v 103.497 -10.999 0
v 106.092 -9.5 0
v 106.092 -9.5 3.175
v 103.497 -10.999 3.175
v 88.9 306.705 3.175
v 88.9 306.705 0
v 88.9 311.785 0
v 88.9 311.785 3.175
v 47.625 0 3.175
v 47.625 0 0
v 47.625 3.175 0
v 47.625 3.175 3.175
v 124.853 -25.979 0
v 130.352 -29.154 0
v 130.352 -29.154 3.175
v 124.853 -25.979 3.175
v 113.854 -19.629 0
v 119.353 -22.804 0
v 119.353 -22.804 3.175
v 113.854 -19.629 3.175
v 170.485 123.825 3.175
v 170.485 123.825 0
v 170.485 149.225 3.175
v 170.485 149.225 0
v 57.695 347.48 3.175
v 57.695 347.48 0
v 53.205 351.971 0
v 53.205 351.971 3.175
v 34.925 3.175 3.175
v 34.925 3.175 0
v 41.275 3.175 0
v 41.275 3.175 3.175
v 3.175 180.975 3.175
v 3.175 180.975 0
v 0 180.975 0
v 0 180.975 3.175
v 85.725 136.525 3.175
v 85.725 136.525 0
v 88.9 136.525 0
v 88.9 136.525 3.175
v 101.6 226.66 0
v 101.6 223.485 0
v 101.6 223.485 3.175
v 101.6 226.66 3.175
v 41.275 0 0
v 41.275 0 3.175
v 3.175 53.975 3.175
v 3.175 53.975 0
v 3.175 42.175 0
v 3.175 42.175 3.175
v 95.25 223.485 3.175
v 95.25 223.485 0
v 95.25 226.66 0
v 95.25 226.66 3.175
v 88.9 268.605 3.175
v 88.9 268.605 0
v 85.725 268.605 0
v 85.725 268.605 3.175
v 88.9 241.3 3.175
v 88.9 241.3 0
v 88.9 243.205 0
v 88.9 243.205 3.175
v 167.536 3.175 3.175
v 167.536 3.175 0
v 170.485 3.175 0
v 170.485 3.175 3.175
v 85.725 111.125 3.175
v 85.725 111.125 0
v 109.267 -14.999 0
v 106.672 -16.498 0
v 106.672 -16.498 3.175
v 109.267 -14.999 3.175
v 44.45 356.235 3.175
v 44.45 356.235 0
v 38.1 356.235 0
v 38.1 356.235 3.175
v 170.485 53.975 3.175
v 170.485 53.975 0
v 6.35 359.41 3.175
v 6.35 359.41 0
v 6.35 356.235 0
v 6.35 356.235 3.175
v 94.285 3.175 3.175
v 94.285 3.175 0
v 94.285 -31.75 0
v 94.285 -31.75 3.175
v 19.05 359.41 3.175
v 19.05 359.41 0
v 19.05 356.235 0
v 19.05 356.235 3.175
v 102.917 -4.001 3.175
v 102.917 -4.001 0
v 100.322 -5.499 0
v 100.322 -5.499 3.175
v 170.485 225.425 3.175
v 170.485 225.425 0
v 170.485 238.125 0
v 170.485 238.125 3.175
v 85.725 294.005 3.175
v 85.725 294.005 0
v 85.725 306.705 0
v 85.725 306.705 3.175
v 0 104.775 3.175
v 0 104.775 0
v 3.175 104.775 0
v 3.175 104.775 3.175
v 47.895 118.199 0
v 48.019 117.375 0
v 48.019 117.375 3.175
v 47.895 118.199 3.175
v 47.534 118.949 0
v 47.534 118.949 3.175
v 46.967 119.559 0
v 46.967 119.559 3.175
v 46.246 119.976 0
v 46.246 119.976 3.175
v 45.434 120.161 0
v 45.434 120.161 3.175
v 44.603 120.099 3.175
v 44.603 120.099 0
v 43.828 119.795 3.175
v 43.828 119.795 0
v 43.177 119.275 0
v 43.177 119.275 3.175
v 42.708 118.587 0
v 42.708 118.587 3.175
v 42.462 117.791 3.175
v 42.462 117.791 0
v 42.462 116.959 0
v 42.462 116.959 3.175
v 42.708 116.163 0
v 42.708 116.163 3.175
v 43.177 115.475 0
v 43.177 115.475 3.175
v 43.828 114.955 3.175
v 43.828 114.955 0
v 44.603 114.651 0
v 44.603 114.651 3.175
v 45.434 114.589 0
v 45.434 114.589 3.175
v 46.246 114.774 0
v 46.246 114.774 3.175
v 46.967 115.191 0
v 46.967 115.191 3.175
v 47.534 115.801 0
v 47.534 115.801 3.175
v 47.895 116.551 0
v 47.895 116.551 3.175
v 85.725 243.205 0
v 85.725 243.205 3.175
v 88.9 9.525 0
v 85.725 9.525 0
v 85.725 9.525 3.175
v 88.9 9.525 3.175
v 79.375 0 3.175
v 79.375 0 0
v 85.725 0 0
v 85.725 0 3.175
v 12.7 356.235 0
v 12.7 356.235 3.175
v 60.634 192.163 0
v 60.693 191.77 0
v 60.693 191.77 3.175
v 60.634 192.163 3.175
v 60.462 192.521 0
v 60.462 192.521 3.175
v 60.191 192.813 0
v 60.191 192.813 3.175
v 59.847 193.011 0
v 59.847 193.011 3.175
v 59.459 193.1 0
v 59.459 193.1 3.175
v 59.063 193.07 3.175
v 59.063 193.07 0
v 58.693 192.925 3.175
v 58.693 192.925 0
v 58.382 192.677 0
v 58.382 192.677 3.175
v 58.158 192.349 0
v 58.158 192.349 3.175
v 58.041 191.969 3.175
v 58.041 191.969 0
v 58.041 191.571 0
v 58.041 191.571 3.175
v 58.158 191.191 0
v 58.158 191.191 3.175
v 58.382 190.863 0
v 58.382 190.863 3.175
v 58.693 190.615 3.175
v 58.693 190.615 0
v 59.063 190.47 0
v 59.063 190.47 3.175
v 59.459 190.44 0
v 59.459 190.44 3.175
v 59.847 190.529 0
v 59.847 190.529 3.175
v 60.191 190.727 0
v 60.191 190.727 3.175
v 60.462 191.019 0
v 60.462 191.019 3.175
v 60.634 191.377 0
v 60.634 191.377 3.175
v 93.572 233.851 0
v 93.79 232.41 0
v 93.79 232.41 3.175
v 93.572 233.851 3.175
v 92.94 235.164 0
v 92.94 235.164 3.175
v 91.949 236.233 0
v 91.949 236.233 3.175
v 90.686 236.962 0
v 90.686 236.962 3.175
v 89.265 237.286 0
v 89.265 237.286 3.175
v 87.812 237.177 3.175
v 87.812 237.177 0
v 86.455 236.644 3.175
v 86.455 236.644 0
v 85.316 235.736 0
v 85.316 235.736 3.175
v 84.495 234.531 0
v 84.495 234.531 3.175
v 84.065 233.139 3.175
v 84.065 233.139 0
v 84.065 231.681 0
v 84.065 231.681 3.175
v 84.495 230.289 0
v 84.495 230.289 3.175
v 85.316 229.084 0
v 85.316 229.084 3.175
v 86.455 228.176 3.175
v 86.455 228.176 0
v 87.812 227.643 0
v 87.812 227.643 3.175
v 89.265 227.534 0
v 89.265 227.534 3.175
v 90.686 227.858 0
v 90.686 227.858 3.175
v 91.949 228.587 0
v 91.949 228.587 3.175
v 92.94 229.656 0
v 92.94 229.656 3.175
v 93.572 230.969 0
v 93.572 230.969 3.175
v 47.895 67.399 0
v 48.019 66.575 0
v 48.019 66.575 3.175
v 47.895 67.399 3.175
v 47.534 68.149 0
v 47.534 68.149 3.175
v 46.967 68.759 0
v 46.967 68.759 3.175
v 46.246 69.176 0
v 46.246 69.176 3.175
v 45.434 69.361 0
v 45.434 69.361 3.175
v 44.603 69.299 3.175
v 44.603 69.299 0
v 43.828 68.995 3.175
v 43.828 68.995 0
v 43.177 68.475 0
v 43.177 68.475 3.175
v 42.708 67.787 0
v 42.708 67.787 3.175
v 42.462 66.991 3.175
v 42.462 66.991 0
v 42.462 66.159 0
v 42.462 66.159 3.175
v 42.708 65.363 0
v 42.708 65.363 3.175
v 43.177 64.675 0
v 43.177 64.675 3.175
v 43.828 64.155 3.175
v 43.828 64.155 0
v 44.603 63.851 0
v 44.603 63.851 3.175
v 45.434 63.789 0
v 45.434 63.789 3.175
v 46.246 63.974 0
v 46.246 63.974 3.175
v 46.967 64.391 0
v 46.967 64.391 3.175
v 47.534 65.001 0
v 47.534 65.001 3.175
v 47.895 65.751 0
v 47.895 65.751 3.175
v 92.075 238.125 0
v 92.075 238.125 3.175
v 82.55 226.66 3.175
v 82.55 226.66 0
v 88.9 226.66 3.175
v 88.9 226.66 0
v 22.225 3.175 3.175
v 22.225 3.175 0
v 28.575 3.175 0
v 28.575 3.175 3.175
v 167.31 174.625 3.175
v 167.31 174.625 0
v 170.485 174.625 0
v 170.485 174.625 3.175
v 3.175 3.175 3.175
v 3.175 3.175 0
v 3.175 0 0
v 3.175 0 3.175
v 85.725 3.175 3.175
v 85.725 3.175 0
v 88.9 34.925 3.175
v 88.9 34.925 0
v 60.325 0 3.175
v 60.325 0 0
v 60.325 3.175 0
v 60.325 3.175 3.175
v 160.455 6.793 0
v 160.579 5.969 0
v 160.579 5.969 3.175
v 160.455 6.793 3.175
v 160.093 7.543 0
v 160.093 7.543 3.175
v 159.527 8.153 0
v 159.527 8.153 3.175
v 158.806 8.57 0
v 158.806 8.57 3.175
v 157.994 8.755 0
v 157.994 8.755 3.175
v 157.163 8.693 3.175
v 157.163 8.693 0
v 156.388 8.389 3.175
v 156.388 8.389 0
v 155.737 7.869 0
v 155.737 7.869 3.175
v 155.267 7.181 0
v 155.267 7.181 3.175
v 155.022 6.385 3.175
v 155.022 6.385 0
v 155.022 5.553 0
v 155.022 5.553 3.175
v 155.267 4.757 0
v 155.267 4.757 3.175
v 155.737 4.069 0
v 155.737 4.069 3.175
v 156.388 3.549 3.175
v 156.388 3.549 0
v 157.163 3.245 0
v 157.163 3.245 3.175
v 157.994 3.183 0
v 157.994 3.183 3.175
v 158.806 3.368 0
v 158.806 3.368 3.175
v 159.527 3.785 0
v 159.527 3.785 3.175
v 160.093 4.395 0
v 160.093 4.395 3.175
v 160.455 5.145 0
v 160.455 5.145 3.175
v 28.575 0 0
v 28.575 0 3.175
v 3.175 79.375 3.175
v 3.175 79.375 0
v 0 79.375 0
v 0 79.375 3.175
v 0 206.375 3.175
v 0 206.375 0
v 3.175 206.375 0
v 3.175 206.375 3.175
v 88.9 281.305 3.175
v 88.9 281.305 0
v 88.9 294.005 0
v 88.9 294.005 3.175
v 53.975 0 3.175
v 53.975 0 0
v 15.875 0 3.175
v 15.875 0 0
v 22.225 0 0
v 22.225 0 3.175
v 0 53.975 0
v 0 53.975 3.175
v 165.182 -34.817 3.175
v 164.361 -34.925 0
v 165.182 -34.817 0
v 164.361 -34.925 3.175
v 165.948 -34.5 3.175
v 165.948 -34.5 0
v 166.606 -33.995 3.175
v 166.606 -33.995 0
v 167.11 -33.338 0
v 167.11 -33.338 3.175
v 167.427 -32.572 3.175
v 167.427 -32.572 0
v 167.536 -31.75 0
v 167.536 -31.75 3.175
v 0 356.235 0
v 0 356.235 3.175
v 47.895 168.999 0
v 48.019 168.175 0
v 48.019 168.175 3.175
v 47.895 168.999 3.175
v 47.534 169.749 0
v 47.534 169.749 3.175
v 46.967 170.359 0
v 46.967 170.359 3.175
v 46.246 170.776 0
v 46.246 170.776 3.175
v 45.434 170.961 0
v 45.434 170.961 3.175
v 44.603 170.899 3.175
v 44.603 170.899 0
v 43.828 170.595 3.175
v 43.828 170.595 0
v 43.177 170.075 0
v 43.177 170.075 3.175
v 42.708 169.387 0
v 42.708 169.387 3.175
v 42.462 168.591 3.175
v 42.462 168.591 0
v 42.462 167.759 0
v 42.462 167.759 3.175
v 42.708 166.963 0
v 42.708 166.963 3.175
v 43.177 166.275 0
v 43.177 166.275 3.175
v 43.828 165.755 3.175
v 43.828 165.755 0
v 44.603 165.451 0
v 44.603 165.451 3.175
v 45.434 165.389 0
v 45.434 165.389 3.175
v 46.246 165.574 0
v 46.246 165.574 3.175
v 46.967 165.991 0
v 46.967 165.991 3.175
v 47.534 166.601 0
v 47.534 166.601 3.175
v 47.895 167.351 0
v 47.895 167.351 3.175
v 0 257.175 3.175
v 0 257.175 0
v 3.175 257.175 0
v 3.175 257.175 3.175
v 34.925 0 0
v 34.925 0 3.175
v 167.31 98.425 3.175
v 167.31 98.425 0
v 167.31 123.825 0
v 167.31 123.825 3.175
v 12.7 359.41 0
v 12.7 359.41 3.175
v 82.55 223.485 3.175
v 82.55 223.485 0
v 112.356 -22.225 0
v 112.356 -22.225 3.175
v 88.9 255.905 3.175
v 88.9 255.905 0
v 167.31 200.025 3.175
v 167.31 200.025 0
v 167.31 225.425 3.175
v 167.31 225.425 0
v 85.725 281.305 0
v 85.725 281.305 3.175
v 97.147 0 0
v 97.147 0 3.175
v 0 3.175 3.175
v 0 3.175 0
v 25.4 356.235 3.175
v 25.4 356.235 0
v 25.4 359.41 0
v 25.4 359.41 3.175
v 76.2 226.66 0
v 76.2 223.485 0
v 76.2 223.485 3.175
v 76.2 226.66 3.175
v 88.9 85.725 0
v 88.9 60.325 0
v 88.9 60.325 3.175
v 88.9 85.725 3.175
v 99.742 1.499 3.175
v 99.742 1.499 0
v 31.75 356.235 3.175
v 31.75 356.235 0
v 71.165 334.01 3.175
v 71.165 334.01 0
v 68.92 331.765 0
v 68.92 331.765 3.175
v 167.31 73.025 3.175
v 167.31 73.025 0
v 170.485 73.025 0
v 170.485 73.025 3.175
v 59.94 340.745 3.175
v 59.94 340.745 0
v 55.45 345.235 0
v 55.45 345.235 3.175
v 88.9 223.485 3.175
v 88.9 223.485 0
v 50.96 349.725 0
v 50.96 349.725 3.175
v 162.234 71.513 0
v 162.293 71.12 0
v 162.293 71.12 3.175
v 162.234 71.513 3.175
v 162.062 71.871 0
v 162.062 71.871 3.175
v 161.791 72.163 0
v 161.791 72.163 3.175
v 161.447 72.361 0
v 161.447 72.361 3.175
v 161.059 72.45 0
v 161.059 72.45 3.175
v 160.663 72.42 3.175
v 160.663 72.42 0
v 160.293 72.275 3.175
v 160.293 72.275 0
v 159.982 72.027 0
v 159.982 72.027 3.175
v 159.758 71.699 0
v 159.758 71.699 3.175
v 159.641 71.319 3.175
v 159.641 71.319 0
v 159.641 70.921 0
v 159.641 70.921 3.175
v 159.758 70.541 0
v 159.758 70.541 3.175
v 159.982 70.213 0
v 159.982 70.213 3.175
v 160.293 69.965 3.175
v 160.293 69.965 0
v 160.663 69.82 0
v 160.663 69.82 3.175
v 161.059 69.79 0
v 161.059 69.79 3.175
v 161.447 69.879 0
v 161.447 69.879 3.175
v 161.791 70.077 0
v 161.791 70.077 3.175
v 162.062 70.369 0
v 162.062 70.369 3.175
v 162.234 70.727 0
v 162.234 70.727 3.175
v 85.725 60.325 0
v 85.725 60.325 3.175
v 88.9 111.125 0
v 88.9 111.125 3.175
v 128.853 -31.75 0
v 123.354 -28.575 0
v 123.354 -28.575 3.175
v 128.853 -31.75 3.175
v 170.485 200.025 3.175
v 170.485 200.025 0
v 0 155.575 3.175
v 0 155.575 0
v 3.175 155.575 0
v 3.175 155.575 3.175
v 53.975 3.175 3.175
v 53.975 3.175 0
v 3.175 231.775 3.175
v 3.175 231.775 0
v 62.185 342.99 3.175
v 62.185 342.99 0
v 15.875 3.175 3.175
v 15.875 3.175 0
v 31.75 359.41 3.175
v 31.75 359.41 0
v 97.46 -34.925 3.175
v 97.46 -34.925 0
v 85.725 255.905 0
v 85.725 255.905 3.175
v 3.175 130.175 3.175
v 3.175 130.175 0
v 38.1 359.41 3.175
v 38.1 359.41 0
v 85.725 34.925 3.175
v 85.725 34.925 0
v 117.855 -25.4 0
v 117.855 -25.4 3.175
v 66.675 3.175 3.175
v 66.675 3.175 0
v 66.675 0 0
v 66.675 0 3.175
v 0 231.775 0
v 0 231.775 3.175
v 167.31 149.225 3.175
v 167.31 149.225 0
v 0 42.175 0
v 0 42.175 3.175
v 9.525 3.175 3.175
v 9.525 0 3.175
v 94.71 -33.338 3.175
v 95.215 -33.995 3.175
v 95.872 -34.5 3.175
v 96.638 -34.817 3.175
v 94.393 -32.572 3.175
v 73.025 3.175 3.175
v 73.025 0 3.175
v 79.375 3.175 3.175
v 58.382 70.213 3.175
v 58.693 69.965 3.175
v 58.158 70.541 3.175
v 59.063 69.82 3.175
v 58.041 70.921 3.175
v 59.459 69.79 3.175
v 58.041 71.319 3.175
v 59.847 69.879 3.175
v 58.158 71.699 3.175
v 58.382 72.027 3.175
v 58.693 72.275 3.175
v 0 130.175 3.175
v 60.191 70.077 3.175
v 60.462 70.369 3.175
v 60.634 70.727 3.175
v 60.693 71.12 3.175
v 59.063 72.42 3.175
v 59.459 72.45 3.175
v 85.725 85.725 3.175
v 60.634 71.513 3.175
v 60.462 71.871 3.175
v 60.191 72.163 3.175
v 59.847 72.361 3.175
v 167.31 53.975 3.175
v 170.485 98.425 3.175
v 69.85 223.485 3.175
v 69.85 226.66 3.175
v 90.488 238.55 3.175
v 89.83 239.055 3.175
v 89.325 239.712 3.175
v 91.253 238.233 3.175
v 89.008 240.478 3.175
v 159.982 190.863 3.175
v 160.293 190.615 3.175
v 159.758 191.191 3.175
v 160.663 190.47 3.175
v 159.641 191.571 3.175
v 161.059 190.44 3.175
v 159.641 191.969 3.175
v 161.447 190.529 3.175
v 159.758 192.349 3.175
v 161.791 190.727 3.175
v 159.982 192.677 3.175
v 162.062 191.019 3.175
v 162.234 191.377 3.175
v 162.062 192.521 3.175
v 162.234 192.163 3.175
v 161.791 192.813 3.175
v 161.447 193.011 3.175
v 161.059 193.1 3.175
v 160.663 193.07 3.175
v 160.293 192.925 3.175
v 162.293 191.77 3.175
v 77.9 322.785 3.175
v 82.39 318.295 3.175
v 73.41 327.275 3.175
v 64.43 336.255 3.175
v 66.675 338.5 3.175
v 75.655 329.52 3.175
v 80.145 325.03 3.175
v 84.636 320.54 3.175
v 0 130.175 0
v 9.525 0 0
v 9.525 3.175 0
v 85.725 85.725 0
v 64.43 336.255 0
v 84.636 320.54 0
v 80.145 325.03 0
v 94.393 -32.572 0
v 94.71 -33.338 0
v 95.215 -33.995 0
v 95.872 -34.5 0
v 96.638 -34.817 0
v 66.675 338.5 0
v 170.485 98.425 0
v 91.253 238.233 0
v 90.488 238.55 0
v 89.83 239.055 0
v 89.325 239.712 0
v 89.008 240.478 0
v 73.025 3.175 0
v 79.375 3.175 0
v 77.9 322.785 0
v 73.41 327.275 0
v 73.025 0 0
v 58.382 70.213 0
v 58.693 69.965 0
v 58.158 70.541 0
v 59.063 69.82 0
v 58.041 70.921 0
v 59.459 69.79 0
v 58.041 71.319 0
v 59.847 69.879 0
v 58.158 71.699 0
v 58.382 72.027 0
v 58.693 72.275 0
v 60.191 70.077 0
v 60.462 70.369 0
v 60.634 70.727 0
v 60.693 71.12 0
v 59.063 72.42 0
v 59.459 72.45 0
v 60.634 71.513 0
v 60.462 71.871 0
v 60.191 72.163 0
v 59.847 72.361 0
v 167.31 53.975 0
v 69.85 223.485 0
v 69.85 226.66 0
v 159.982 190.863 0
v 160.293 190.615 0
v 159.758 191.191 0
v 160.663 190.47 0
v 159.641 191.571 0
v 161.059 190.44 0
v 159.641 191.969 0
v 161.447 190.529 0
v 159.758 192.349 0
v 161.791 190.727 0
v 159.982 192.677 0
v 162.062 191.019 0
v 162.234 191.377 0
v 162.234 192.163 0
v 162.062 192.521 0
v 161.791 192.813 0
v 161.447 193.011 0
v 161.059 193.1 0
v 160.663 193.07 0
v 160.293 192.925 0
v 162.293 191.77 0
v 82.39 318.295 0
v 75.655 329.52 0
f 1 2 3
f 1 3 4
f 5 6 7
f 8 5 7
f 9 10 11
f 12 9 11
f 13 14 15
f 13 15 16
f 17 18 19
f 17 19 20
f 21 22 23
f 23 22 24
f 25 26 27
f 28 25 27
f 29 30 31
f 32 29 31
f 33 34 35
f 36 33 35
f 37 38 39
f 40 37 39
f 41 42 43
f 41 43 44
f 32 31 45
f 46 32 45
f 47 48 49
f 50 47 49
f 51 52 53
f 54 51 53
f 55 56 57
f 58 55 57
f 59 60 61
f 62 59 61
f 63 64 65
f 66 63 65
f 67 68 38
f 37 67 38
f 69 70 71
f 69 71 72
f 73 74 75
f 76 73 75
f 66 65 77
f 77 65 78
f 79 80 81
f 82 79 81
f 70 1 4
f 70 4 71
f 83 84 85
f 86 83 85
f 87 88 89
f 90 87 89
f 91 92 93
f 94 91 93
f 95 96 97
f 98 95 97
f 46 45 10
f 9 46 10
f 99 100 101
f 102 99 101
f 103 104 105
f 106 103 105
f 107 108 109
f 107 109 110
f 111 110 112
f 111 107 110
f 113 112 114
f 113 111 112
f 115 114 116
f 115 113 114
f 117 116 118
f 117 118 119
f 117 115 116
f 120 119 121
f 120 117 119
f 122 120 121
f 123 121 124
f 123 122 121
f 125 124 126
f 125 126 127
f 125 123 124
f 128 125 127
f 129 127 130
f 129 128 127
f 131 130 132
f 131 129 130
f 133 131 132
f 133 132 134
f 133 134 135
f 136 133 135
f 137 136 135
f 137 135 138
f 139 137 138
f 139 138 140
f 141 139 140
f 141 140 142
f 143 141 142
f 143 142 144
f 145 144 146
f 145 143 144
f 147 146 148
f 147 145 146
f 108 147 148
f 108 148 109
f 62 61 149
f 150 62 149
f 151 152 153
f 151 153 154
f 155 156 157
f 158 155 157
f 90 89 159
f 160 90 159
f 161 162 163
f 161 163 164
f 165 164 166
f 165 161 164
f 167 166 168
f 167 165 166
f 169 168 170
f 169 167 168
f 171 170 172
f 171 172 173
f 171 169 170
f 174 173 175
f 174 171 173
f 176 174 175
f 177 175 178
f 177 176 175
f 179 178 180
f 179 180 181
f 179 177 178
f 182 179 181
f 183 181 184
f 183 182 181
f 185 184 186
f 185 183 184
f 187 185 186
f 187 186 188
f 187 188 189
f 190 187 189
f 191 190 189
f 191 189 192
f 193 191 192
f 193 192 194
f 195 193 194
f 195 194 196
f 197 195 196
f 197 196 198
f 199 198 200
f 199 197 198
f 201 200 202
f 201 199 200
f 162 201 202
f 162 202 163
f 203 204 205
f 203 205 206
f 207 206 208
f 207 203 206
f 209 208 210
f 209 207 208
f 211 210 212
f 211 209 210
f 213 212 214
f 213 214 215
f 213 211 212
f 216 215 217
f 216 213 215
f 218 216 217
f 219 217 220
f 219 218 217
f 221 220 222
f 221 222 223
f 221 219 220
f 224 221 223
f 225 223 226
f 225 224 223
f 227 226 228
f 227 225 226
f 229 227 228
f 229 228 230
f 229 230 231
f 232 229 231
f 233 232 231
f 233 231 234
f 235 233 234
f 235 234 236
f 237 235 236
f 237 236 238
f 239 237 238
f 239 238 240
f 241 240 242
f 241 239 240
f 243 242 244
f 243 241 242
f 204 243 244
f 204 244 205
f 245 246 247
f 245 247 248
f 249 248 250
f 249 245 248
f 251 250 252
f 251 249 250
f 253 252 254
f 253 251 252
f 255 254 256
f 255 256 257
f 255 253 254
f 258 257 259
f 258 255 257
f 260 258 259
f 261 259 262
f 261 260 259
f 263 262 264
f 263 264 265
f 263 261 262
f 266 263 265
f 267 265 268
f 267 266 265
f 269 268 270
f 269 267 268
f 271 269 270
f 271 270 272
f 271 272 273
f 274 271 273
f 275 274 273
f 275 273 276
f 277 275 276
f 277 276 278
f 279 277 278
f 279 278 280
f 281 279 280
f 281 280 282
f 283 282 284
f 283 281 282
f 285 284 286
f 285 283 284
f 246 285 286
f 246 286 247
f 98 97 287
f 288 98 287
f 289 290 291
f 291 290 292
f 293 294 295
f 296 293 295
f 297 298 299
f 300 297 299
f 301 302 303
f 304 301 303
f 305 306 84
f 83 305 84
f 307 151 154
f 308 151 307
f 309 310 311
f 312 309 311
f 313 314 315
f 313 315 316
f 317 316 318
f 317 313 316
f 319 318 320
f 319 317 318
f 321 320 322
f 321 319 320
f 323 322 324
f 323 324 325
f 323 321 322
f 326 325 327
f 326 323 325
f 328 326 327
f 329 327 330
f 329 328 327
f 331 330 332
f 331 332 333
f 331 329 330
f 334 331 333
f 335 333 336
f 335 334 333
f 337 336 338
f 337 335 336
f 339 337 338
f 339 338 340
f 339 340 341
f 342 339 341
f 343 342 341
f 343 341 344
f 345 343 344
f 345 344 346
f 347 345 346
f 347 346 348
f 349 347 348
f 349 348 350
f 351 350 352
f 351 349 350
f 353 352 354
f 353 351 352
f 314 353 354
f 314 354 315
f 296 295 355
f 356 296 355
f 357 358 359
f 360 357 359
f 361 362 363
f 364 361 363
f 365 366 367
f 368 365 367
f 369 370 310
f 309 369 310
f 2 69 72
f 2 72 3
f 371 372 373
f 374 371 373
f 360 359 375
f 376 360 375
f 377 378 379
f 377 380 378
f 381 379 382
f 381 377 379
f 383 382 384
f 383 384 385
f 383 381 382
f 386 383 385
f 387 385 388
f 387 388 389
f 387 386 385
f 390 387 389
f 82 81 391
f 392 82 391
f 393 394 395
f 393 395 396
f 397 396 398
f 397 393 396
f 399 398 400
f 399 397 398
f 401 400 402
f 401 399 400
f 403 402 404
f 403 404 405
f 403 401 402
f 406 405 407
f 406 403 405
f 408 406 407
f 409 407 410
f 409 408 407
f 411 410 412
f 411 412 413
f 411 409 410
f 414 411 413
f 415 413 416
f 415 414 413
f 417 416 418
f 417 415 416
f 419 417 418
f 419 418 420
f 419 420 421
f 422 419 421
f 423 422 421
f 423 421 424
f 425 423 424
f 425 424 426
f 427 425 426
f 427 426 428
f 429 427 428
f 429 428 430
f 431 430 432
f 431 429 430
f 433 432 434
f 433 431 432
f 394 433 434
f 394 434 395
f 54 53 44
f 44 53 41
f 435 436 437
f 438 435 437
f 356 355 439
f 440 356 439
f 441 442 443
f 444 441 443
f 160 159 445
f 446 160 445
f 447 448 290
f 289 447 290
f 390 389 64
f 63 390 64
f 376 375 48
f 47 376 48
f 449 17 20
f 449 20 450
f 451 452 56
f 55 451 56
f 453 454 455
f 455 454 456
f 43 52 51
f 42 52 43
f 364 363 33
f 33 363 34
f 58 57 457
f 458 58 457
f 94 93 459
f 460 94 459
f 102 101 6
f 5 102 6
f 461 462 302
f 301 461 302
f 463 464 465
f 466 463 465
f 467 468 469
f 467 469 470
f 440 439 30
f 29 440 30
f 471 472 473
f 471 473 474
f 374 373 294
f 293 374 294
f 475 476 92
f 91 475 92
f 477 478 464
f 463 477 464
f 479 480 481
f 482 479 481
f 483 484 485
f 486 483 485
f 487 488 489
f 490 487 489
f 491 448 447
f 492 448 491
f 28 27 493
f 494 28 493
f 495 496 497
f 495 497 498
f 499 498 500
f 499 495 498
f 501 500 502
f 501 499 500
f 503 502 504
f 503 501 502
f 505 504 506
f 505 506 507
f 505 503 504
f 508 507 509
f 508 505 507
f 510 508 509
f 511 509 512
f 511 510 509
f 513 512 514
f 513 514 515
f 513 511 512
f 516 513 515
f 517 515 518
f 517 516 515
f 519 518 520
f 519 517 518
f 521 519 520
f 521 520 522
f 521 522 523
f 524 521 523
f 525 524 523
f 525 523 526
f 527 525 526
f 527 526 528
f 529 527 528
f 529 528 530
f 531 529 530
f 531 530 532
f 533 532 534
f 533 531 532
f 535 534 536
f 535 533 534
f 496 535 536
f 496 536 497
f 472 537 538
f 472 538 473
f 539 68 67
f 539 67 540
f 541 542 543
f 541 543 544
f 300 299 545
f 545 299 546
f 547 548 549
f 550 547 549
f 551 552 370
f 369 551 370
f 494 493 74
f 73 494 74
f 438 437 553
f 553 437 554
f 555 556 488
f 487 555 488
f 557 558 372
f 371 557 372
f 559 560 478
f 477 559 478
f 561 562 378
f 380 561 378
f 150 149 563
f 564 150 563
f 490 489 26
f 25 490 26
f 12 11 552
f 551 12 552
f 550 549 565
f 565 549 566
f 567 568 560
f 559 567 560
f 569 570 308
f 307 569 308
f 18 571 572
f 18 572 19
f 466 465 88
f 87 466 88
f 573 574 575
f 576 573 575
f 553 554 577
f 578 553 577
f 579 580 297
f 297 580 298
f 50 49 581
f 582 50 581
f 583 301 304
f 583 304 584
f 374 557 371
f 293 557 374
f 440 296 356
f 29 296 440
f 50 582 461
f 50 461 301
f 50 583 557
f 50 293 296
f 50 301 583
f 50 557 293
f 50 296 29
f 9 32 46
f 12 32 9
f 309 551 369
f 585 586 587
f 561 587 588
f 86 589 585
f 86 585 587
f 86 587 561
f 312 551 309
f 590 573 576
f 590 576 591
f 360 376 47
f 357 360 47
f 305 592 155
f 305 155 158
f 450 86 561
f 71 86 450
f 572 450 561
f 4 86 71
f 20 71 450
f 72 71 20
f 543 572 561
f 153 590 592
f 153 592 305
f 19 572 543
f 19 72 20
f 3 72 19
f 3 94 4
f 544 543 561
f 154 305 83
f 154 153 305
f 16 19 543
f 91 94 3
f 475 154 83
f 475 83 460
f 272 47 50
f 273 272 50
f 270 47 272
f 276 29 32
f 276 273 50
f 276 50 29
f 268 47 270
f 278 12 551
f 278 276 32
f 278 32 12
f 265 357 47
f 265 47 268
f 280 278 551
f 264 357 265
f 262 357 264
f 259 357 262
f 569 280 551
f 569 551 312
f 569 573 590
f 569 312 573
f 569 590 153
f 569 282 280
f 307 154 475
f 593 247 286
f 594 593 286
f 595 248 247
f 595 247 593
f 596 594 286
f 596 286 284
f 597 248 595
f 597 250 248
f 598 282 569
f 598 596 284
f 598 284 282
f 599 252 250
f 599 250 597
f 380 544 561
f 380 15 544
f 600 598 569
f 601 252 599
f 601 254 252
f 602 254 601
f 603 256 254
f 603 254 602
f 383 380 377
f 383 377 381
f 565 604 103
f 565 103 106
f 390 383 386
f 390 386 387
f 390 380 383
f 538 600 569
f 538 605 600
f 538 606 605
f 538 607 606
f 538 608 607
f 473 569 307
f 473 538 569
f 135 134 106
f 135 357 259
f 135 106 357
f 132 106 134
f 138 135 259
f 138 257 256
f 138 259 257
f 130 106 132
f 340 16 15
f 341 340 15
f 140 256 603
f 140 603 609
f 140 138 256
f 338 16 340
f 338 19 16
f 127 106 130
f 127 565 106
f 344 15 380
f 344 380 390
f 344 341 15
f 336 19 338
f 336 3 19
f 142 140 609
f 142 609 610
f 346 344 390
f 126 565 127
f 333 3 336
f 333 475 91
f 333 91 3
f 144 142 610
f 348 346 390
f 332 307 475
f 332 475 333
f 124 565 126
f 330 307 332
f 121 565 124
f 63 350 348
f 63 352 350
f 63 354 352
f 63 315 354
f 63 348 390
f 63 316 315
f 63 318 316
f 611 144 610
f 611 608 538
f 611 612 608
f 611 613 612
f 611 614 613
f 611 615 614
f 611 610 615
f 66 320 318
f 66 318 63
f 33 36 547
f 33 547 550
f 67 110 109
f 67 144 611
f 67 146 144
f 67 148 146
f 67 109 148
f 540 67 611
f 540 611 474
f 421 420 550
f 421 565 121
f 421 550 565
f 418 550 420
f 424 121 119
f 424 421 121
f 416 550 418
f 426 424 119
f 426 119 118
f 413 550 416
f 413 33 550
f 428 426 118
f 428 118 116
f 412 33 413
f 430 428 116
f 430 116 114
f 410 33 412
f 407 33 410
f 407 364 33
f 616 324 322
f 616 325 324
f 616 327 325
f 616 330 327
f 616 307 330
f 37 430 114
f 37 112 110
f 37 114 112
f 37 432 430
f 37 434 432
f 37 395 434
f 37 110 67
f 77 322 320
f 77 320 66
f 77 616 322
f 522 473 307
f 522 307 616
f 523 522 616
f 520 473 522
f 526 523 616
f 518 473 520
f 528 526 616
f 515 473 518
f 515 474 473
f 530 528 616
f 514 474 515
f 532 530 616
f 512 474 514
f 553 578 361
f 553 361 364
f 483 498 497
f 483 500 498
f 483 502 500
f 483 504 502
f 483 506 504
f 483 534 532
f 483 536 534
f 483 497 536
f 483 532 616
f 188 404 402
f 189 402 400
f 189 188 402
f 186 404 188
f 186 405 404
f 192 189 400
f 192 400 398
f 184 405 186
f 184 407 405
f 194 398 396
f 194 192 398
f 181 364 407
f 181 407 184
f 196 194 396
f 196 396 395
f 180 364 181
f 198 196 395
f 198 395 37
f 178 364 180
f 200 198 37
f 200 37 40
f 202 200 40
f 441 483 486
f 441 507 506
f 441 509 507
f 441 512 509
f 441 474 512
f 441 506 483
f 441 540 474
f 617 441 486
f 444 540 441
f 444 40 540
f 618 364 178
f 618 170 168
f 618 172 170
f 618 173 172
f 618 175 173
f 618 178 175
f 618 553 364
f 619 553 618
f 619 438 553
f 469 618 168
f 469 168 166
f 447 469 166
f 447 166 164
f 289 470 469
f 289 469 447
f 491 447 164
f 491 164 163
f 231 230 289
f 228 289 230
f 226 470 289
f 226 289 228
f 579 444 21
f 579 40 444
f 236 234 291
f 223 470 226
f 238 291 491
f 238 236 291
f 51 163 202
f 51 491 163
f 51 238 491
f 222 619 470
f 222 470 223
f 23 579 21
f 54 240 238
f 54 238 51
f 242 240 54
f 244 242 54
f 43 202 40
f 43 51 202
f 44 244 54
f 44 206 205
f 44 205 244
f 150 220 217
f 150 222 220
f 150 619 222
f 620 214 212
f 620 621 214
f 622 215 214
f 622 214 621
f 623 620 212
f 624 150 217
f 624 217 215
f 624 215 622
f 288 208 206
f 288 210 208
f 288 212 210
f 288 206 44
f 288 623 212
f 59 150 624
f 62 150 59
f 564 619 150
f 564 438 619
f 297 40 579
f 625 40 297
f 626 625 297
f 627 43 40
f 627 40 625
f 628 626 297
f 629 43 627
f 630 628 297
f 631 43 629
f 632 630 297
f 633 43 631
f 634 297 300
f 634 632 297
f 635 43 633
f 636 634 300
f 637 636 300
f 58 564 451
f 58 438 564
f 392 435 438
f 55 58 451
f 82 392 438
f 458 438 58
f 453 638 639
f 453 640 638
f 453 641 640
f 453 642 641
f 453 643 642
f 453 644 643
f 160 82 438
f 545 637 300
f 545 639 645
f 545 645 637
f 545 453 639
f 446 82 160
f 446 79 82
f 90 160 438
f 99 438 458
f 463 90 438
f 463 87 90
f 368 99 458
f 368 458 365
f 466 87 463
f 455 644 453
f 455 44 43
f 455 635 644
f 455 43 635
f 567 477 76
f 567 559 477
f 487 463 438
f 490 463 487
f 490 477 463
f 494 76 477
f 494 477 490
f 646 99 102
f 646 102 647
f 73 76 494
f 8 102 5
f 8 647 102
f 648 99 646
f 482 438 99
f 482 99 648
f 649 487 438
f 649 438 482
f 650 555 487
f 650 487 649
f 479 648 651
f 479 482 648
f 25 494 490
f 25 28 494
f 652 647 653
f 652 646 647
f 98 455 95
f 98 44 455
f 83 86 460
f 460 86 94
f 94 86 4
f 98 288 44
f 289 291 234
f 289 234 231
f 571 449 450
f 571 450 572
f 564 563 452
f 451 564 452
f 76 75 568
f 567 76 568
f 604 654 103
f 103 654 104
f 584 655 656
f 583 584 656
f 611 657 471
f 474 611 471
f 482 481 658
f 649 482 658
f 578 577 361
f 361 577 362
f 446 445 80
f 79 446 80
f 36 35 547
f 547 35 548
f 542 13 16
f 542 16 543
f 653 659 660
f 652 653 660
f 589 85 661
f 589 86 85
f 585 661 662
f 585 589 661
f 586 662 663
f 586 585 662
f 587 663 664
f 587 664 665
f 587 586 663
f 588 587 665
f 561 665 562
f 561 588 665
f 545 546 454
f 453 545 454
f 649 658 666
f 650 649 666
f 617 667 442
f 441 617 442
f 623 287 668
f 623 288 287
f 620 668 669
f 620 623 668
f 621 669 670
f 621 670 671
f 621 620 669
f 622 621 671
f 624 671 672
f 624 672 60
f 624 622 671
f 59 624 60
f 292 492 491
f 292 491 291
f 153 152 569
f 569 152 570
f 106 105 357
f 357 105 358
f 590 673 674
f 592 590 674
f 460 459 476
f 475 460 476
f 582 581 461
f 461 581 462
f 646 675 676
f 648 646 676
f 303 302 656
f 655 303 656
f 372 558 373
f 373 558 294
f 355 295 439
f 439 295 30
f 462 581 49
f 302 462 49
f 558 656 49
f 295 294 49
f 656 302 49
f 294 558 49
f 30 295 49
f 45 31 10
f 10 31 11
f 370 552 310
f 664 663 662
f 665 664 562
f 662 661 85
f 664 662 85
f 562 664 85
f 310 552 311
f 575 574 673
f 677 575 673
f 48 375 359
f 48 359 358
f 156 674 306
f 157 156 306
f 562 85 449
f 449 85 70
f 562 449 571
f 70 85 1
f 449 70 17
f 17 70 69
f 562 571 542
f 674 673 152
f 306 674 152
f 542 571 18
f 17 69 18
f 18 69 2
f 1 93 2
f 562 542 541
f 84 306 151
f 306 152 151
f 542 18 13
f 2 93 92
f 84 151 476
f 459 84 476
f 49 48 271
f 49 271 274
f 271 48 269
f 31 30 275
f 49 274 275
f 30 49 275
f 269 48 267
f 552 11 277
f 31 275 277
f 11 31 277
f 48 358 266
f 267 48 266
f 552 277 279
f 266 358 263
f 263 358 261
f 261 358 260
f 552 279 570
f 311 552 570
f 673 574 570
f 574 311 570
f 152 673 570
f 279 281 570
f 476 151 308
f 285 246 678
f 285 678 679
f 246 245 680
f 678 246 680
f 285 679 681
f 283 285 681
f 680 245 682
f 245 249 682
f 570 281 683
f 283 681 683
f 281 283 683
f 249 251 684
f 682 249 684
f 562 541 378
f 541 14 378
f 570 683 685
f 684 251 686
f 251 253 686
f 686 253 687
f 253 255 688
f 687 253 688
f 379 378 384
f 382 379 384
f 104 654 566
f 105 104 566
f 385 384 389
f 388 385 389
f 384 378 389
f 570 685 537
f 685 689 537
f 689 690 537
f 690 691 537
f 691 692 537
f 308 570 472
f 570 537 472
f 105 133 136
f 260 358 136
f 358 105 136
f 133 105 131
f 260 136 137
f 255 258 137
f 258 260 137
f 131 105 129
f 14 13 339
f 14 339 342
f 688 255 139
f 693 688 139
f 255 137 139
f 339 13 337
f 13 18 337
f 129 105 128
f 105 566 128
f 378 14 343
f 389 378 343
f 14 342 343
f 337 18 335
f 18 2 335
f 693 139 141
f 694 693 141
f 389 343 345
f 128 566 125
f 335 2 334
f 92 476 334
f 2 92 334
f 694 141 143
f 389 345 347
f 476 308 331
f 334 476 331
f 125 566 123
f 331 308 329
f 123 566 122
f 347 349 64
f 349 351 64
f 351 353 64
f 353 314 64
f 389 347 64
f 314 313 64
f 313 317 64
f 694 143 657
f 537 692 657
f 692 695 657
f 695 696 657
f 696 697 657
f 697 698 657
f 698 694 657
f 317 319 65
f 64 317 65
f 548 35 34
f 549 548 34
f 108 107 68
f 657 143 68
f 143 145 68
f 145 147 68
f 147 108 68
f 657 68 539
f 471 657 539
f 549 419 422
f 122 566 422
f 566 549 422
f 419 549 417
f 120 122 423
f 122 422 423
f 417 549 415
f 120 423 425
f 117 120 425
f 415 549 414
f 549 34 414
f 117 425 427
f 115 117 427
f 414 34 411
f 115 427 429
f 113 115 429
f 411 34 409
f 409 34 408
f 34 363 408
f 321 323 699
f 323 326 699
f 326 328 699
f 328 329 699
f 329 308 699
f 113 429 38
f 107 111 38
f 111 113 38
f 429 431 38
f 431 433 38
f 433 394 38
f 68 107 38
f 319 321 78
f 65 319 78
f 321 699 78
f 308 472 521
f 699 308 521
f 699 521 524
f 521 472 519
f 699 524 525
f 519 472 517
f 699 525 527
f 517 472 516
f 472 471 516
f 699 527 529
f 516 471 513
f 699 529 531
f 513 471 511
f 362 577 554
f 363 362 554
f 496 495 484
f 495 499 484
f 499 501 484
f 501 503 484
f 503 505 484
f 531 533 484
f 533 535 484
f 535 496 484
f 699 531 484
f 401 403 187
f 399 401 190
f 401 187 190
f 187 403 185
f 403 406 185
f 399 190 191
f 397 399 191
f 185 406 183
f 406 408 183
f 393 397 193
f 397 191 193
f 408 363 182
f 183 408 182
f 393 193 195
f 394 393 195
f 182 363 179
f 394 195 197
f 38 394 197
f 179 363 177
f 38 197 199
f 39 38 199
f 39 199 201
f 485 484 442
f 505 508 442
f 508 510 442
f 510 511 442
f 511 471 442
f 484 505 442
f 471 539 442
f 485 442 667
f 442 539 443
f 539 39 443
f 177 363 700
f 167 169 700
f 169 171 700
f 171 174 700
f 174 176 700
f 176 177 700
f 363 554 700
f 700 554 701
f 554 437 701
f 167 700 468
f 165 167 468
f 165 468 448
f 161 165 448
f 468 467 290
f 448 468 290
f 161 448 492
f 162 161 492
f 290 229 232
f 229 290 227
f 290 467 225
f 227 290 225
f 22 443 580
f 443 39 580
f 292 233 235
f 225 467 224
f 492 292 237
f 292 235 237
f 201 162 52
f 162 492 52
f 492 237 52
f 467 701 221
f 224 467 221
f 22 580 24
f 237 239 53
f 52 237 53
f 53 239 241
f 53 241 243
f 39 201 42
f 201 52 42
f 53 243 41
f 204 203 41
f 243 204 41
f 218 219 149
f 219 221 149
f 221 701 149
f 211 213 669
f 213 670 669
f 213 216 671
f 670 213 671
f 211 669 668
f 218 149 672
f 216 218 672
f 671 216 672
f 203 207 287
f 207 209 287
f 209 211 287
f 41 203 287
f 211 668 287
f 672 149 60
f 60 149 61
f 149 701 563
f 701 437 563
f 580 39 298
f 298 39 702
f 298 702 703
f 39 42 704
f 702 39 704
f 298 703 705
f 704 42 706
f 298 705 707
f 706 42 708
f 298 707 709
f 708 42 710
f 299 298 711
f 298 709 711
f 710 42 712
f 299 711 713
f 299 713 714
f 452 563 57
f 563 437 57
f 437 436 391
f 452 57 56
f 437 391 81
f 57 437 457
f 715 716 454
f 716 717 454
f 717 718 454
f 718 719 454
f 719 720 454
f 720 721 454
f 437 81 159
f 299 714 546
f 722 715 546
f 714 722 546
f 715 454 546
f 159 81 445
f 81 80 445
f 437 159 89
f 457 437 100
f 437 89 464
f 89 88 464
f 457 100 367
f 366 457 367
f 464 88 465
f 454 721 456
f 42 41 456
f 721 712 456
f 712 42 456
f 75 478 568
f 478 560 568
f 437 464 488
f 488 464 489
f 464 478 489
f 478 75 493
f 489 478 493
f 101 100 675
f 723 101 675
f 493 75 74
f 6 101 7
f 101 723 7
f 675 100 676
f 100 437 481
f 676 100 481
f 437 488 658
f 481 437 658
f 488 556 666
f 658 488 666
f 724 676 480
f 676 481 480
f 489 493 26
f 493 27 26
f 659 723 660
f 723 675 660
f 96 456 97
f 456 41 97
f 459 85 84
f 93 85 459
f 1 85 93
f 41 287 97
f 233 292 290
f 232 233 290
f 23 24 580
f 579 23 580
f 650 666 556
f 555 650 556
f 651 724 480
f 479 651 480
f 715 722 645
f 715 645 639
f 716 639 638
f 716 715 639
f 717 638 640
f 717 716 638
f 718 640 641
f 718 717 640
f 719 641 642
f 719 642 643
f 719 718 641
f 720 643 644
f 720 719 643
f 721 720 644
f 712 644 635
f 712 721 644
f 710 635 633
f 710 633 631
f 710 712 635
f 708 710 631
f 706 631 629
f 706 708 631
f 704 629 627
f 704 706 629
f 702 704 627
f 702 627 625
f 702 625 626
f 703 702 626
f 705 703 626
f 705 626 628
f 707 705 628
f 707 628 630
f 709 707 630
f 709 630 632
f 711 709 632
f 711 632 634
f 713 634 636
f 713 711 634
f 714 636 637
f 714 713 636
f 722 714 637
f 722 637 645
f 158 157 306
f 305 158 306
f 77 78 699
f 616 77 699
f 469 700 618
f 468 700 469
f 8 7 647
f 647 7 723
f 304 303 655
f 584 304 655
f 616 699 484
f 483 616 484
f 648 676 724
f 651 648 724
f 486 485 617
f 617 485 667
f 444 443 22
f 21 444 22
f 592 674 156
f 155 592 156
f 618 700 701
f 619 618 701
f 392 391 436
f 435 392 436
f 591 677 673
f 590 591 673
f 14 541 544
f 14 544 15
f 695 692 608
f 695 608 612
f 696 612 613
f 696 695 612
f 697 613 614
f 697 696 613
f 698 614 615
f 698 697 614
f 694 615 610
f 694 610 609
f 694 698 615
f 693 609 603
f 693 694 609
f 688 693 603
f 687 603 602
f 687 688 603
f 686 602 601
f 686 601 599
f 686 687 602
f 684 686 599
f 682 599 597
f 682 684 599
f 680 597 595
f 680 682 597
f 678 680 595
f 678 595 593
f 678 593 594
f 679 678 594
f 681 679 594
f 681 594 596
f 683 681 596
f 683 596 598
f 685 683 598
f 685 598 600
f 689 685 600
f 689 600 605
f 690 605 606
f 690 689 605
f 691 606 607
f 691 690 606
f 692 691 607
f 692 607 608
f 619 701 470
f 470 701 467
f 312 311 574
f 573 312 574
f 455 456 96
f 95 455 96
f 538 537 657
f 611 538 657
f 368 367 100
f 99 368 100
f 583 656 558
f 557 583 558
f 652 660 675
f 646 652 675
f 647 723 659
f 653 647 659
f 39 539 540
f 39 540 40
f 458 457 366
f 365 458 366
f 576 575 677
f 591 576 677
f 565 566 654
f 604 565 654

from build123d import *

# Parameters (mm, degrees)
SKETCH1_R           = 4.8895
SKETCH1_R_2         = 1.3335
SKETCH1_R_3         = 2.794
SKETCH1_W           = 3.175
SKETCH1_H           = 25.4
SKETCH1_W_2         = 6.35
SKETCH1_H_2         = 3.175
BOSS_EXTRUDE2_DEPTH = 3.175
FILLET1_R           = 3.175


with BuildPart() as part:
    # Sketch1 → Boss-Extrude2 (new body)
    with BuildSketch(Plane.XY):
        Polygon((0, 3.175), (3.175, 3.175), (3.175, 0), (9.525, 0), (9.525, 3.175), (15.875, 3.175), (15.875, 0), (22.225, 0), (22.225, 3.175), (28.575, 3.175), (28.575, 0), (34.925, 0), (34.925, 3.175), (41.275, 3.175), (41.275, 0), (47.625, 0), (47.625, 3.175), (53.975, 3.175), (53.975, 0), (60.325, 0), (60.325, 3.175), (66.675, 3.175), (66.675, 0), (73.025, 0), (73.025, 3.175), (79.375, 3.175), (79.375, 0), (85.725, 0), (85.725, 3.175), (88.9, 3.175), (94.2848, 3.175), (94.2848, -34.925), (167.535593046, -34.925), (167.535593046, 3.175), (170.4848, 3.175), (170.4848, 53.975), (167.3098, 53.975), (167.3098, 73.025), (170.4848, 73.025), (170.4848, 98.425), (167.3098, 98.425), (167.3098, 123.825), (170.4848, 123.825), (170.4848, 149.225), (167.3098, 149.225), (167.3098, 174.625), (170.4848, 174.625), (170.4848, 200.025), (167.3098, 200.025), (167.3098, 225.425), (170.4848, 225.425), (170.4848, 238.125), (88.9, 238.125), (88.9, 243.205), (85.725, 243.205), (85.725, 255.905), (88.9, 255.905), (88.9, 268.605), (85.725, 268.605), (85.725, 281.305), (88.9, 281.305), (88.9, 294.005), (85.725, 294.005), (85.725, 306.705), (88.9, 306.705), (88.9, 311.785), (82.390448212, 318.294551788), (84.635512242, 320.539615818), (80.145384182, 325.029743879), (77.900320151, 322.784679849), (73.410192091, 327.274807909), (75.655256121, 329.519871939), (71.165128061, 334.01), (68.92006403, 331.76493597), (64.42993597, 336.25506403), (66.675, 338.500128061), (62.184871939, 342.990256121), (59.939807909, 340.745192091), (55.449679849, 345.235320151), (57.694743879, 347.480384182), (53.204615818, 351.970512242), (50.959551788, 349.725448212), (44.45, 356.235), (38.1, 356.235), (38.1, 359.41), (31.75, 359.41), (31.75, 356.235), (25.4, 356.235), (25.4, 359.41), (19.05, 359.41), (19.05, 356.235), (12.7, 356.235), (12.7, 359.41), (6.35, 359.41), (6.35, 356.235), (0, 356.235), (0, 257.175), (3.175, 257.175), (3.175, 231.775), (0, 231.775), (0, 206.375), (3.175, 206.375), (3.175, 180.975), (0, 180.975), (0, 155.575), (3.175, 155.575), (3.175, 130.175), (0, 130.175), (0, 104.775), (3.175, 104.775), (3.175, 79.375), (0, 79.375), (0, 53.975), (3.175, 53.975), (3.175, 42.175), (0, 42.175), (0, 28.575), align=None)
        with Locations((88.9, 232.41)):
            Circle(SKETCH1_R, mode=Mode.SUBTRACT)
        with Locations((59.3598, 191.77)):
            Circle(SKETCH1_R_2, mode=Mode.SUBTRACT)
        with Locations((59.3598, 71.12)):
            Circle(SKETCH1_R_2, mode=Mode.SUBTRACT)
        with Locations((160.9598, 71.12)):
            Circle(SKETCH1_R_2, mode=Mode.SUBTRACT)
        with Locations((160.9598, 191.77)):
            Circle(SKETCH1_R_2, mode=Mode.SUBTRACT)
        with Locations((157.7848, 5.969)):
            Circle(SKETCH1_R_3, mode=Mode.SUBTRACT)
        with Locations((45.225, 66.574999946)):
            Circle(SKETCH1_R_3, mode=Mode.SUBTRACT)
        with Locations((45.225, 117.374999946)):
            Circle(SKETCH1_R_3, mode=Mode.SUBTRACT)
        with Locations((45.225, 168.174999946)):
            Circle(SKETCH1_R_3, mode=Mode.SUBTRACT)
        with Locations((87.3125, 123.825)):
            Rectangle(SKETCH1_W, SKETCH1_H, mode=Mode.SUBTRACT)
        Polygon((99.742302456, 1.4986), (102.917302456, -4.000661314), (100.321651116, -5.499261314), (97.146651116, 0), align=None, mode=Mode.SUBTRACT)
        with Locations((87.3125, 73.025)):
            Rectangle(SKETCH1_W, SKETCH1_H, mode=Mode.SUBTRACT)
        with Locations((87.3125, 22.225)):
            Rectangle(SKETCH1_W, SKETCH1_H, mode=Mode.SUBTRACT)
        with Locations((73.025, 225.0725)):
            Rectangle(SKETCH1_W_2, SKETCH1_H_2, mode=Mode.SUBTRACT)
        with Locations((85.725, 225.0725)):
            Rectangle(SKETCH1_W_2, SKETCH1_H_2, mode=Mode.SUBTRACT)
        with Locations((98.425, 225.0725)):
            Rectangle(SKETCH1_W_2, SKETCH1_H_2, mode=Mode.SUBTRACT)
        Polygon((106.092302456, -9.499922628), (103.496651116, -10.998522628), (106.671651116, -16.497783942), (109.267302456, -14.999183942), align=None, mode=Mode.SUBTRACT)
        Polygon((113.854167186, -19.62934866), (112.355567186, -22.225), (117.8548285, -25.4), (119.3534285, -22.80434866), align=None, mode=Mode.SUBTRACT)
        Polygon((124.852689814, -25.97934866), (123.354089814, -28.575), (128.853351128, -31.75), (130.351951128, -29.15434866), align=None, mode=Mode.SUBTRACT)
    extrude(amount=BOSS_EXTRUDE2_DEPTH)

    # Fillet1
    fillet1_edges = [part.edges().sort_by_distance(p)[0] for p in [
        (88.9, 238.125, 1.5875),
        (167.535593046, -34.925, 1.5875),
        (94.2848, -34.925, 1.5875),
    ]]
    fillet(fillet1_edges, radius=FILLET1_R)


solid = part.part
